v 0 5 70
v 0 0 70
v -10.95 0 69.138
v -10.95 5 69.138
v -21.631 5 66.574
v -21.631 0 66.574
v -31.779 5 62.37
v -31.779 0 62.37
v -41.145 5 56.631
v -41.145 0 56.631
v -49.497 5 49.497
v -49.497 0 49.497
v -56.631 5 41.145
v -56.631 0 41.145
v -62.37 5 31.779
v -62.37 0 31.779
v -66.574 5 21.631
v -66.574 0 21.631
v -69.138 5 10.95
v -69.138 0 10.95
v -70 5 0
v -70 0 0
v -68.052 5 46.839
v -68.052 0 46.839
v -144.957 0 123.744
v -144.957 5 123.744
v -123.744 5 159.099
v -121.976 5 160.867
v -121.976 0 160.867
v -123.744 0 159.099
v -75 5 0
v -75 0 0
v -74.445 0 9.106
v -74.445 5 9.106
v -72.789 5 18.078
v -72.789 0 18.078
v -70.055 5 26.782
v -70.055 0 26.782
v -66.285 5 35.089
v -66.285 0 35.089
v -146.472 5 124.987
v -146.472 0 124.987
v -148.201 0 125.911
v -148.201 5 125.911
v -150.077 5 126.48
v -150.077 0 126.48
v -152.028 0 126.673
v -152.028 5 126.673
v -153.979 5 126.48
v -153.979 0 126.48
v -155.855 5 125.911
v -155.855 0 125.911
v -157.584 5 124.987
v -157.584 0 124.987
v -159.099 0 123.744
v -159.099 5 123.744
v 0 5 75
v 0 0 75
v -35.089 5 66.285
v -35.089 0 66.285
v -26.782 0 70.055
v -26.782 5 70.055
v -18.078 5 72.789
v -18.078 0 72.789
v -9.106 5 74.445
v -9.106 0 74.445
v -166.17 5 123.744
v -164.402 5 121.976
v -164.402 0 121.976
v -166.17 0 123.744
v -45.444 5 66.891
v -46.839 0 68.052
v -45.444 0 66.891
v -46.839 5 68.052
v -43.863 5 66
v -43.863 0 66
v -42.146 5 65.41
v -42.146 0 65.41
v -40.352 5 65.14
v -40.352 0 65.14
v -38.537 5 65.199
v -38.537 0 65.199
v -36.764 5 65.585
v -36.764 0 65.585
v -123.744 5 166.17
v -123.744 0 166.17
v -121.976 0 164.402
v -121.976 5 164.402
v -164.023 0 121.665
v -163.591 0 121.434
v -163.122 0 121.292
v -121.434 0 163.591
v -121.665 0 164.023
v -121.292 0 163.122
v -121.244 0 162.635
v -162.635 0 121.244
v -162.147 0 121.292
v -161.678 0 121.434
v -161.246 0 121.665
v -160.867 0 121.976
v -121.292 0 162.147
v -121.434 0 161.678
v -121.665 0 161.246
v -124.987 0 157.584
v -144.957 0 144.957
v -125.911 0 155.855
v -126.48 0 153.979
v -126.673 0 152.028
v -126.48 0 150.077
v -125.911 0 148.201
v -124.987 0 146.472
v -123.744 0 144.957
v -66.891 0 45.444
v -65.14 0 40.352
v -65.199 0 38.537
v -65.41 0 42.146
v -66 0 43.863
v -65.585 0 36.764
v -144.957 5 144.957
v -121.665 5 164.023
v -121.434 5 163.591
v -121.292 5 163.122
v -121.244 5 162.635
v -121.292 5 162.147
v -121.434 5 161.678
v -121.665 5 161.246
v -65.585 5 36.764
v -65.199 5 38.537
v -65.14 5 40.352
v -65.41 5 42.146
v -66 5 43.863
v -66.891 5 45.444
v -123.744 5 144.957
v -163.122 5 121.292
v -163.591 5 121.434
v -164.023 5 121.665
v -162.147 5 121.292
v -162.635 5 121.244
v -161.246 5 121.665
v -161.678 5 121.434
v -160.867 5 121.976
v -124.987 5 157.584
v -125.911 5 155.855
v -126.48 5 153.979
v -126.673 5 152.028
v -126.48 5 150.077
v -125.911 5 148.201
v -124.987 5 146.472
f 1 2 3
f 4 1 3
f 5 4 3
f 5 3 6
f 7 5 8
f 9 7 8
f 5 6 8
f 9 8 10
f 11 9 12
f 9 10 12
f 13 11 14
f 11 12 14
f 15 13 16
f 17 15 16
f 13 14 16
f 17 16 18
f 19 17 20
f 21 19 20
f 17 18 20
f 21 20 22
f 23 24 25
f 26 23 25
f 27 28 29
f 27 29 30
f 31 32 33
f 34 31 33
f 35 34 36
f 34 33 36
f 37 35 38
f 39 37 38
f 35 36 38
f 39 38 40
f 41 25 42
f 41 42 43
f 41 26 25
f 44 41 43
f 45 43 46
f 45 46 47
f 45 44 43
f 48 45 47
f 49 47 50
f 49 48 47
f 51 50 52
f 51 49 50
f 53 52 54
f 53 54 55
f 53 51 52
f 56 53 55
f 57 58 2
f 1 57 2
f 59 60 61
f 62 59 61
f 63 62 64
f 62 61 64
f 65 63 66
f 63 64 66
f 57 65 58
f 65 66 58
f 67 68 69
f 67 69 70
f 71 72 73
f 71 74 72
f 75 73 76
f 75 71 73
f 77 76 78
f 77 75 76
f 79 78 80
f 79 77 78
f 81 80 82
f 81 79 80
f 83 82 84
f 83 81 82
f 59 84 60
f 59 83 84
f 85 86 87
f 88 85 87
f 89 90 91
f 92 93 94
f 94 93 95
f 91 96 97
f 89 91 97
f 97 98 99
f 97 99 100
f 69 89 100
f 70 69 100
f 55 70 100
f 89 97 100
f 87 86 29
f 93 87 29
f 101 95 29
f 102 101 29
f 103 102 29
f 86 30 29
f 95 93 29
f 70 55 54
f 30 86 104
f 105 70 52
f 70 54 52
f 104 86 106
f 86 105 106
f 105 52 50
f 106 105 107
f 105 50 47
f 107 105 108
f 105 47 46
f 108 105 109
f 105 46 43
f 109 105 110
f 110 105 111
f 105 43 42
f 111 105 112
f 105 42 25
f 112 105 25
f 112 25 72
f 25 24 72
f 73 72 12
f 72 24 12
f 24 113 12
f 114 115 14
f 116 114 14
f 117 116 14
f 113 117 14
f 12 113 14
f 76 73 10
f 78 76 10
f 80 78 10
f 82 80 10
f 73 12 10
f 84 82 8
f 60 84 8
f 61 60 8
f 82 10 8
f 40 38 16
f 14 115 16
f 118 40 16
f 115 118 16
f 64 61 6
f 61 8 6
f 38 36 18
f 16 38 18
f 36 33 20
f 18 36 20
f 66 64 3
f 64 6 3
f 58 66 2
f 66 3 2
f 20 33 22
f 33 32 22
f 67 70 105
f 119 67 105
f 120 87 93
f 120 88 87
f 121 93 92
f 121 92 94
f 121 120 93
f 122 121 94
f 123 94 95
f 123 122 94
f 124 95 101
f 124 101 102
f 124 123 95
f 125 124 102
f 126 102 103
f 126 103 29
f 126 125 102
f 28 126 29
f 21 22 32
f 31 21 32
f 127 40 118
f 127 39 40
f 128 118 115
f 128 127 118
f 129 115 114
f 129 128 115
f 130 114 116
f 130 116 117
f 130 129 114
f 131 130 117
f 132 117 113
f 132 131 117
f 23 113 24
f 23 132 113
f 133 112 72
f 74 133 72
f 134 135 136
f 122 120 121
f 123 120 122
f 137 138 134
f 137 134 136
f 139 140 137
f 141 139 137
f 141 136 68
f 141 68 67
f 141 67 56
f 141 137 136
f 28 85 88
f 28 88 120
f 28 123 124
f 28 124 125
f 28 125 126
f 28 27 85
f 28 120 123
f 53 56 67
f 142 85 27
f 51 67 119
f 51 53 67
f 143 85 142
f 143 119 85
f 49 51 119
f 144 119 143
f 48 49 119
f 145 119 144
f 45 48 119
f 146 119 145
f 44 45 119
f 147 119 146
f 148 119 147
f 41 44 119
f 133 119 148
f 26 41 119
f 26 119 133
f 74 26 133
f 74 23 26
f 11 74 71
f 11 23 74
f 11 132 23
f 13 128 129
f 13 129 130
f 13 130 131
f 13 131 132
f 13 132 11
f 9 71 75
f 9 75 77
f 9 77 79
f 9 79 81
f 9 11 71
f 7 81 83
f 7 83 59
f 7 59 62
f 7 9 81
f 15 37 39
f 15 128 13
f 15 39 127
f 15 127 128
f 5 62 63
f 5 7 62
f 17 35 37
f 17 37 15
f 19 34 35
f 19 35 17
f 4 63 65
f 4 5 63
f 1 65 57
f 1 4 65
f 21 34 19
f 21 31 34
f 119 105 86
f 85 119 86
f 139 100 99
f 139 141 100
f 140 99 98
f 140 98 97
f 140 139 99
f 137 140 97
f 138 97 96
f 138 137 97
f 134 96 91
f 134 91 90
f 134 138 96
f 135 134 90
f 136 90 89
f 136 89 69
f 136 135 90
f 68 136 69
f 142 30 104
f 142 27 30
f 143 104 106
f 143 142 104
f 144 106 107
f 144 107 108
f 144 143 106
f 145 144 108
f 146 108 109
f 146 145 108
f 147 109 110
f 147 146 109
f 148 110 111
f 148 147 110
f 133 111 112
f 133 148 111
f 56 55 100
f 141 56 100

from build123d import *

# Parameters (mm, degrees)
BOSS_EXTRUDE1_DEPTH = 5
FILLET1_R           = 10
FILLET2_R           = 2.5


with BuildPart() as part:
    # Sketch2 → Boss-Extrude1 (new body)
    with BuildSketch(Plane(origin=(0, 0, 0), x_dir=(1, 0, 0), z_dir=(0, 1, 0))):
        with BuildLine():
            Line((-70, 0), (-75, 0))
            ThreePointArc((-75, 0), (-53.033008589, -53.033008589), (0, -75))
            Line((0, -75), (0, -70))
            ThreePointArc((0, -70), (-49.497474683, -49.497474683), (-70, 0))
        make_face()
        with BuildLine():
            ThreePointArc((-41.354922509, -62.568125945), (-53.033008589, -53.033008589), (-62.568125945, -41.354922509))
            Line((-62.568125945, -41.354922509), (-152.027957955, -130.81475452))
            Line((-152.027957955, -130.81475452), (-162.634559673, -120.208152802))
            Line((-162.634559673, -120.208152802), (-166.170093579, -123.743686708))
            Line((-166.170093579, -123.743686708), (-144.956890143, -144.956890143))
            Line((-144.956890143, -144.956890143), (-123.743686708, -166.170093579))
            Line((-123.743686708, -166.170093579), (-120.208152802, -162.634559673))
            Line((-120.208152802, -162.634559673), (-130.81475452, -152.027957955))
            Line((-130.81475452, -152.027957955), (-41.354922509, -62.568125945))
        make_face()
    extrude(amount=BOSS_EXTRUDE1_DEPTH)

    # Fillet1
    fillet1_edges = [part.edges().sort_by_distance(p)[0] for p in [
        (-41.354922509, 2.5, 62.568125945),
        (-130.81475452, 2.5, 152.027957955),
        (-152.027957955, 2.5, 130.81475452),
        (-62.568125945, 2.5, 41.354922509),
    ]]
    fillet(fillet1_edges, radius=FILLET1_R)

    # Fillet2
    fillet2_edges = [part.edges().sort_by_distance(p)[0] for p in [
        (-120.208152802, 2.5, 162.634559673),
        (-162.634559673, 2.5, 120.208152802),
    ]]
    fillet(fillet2_edges, radius=FILLET2_R)


solid = part.part
